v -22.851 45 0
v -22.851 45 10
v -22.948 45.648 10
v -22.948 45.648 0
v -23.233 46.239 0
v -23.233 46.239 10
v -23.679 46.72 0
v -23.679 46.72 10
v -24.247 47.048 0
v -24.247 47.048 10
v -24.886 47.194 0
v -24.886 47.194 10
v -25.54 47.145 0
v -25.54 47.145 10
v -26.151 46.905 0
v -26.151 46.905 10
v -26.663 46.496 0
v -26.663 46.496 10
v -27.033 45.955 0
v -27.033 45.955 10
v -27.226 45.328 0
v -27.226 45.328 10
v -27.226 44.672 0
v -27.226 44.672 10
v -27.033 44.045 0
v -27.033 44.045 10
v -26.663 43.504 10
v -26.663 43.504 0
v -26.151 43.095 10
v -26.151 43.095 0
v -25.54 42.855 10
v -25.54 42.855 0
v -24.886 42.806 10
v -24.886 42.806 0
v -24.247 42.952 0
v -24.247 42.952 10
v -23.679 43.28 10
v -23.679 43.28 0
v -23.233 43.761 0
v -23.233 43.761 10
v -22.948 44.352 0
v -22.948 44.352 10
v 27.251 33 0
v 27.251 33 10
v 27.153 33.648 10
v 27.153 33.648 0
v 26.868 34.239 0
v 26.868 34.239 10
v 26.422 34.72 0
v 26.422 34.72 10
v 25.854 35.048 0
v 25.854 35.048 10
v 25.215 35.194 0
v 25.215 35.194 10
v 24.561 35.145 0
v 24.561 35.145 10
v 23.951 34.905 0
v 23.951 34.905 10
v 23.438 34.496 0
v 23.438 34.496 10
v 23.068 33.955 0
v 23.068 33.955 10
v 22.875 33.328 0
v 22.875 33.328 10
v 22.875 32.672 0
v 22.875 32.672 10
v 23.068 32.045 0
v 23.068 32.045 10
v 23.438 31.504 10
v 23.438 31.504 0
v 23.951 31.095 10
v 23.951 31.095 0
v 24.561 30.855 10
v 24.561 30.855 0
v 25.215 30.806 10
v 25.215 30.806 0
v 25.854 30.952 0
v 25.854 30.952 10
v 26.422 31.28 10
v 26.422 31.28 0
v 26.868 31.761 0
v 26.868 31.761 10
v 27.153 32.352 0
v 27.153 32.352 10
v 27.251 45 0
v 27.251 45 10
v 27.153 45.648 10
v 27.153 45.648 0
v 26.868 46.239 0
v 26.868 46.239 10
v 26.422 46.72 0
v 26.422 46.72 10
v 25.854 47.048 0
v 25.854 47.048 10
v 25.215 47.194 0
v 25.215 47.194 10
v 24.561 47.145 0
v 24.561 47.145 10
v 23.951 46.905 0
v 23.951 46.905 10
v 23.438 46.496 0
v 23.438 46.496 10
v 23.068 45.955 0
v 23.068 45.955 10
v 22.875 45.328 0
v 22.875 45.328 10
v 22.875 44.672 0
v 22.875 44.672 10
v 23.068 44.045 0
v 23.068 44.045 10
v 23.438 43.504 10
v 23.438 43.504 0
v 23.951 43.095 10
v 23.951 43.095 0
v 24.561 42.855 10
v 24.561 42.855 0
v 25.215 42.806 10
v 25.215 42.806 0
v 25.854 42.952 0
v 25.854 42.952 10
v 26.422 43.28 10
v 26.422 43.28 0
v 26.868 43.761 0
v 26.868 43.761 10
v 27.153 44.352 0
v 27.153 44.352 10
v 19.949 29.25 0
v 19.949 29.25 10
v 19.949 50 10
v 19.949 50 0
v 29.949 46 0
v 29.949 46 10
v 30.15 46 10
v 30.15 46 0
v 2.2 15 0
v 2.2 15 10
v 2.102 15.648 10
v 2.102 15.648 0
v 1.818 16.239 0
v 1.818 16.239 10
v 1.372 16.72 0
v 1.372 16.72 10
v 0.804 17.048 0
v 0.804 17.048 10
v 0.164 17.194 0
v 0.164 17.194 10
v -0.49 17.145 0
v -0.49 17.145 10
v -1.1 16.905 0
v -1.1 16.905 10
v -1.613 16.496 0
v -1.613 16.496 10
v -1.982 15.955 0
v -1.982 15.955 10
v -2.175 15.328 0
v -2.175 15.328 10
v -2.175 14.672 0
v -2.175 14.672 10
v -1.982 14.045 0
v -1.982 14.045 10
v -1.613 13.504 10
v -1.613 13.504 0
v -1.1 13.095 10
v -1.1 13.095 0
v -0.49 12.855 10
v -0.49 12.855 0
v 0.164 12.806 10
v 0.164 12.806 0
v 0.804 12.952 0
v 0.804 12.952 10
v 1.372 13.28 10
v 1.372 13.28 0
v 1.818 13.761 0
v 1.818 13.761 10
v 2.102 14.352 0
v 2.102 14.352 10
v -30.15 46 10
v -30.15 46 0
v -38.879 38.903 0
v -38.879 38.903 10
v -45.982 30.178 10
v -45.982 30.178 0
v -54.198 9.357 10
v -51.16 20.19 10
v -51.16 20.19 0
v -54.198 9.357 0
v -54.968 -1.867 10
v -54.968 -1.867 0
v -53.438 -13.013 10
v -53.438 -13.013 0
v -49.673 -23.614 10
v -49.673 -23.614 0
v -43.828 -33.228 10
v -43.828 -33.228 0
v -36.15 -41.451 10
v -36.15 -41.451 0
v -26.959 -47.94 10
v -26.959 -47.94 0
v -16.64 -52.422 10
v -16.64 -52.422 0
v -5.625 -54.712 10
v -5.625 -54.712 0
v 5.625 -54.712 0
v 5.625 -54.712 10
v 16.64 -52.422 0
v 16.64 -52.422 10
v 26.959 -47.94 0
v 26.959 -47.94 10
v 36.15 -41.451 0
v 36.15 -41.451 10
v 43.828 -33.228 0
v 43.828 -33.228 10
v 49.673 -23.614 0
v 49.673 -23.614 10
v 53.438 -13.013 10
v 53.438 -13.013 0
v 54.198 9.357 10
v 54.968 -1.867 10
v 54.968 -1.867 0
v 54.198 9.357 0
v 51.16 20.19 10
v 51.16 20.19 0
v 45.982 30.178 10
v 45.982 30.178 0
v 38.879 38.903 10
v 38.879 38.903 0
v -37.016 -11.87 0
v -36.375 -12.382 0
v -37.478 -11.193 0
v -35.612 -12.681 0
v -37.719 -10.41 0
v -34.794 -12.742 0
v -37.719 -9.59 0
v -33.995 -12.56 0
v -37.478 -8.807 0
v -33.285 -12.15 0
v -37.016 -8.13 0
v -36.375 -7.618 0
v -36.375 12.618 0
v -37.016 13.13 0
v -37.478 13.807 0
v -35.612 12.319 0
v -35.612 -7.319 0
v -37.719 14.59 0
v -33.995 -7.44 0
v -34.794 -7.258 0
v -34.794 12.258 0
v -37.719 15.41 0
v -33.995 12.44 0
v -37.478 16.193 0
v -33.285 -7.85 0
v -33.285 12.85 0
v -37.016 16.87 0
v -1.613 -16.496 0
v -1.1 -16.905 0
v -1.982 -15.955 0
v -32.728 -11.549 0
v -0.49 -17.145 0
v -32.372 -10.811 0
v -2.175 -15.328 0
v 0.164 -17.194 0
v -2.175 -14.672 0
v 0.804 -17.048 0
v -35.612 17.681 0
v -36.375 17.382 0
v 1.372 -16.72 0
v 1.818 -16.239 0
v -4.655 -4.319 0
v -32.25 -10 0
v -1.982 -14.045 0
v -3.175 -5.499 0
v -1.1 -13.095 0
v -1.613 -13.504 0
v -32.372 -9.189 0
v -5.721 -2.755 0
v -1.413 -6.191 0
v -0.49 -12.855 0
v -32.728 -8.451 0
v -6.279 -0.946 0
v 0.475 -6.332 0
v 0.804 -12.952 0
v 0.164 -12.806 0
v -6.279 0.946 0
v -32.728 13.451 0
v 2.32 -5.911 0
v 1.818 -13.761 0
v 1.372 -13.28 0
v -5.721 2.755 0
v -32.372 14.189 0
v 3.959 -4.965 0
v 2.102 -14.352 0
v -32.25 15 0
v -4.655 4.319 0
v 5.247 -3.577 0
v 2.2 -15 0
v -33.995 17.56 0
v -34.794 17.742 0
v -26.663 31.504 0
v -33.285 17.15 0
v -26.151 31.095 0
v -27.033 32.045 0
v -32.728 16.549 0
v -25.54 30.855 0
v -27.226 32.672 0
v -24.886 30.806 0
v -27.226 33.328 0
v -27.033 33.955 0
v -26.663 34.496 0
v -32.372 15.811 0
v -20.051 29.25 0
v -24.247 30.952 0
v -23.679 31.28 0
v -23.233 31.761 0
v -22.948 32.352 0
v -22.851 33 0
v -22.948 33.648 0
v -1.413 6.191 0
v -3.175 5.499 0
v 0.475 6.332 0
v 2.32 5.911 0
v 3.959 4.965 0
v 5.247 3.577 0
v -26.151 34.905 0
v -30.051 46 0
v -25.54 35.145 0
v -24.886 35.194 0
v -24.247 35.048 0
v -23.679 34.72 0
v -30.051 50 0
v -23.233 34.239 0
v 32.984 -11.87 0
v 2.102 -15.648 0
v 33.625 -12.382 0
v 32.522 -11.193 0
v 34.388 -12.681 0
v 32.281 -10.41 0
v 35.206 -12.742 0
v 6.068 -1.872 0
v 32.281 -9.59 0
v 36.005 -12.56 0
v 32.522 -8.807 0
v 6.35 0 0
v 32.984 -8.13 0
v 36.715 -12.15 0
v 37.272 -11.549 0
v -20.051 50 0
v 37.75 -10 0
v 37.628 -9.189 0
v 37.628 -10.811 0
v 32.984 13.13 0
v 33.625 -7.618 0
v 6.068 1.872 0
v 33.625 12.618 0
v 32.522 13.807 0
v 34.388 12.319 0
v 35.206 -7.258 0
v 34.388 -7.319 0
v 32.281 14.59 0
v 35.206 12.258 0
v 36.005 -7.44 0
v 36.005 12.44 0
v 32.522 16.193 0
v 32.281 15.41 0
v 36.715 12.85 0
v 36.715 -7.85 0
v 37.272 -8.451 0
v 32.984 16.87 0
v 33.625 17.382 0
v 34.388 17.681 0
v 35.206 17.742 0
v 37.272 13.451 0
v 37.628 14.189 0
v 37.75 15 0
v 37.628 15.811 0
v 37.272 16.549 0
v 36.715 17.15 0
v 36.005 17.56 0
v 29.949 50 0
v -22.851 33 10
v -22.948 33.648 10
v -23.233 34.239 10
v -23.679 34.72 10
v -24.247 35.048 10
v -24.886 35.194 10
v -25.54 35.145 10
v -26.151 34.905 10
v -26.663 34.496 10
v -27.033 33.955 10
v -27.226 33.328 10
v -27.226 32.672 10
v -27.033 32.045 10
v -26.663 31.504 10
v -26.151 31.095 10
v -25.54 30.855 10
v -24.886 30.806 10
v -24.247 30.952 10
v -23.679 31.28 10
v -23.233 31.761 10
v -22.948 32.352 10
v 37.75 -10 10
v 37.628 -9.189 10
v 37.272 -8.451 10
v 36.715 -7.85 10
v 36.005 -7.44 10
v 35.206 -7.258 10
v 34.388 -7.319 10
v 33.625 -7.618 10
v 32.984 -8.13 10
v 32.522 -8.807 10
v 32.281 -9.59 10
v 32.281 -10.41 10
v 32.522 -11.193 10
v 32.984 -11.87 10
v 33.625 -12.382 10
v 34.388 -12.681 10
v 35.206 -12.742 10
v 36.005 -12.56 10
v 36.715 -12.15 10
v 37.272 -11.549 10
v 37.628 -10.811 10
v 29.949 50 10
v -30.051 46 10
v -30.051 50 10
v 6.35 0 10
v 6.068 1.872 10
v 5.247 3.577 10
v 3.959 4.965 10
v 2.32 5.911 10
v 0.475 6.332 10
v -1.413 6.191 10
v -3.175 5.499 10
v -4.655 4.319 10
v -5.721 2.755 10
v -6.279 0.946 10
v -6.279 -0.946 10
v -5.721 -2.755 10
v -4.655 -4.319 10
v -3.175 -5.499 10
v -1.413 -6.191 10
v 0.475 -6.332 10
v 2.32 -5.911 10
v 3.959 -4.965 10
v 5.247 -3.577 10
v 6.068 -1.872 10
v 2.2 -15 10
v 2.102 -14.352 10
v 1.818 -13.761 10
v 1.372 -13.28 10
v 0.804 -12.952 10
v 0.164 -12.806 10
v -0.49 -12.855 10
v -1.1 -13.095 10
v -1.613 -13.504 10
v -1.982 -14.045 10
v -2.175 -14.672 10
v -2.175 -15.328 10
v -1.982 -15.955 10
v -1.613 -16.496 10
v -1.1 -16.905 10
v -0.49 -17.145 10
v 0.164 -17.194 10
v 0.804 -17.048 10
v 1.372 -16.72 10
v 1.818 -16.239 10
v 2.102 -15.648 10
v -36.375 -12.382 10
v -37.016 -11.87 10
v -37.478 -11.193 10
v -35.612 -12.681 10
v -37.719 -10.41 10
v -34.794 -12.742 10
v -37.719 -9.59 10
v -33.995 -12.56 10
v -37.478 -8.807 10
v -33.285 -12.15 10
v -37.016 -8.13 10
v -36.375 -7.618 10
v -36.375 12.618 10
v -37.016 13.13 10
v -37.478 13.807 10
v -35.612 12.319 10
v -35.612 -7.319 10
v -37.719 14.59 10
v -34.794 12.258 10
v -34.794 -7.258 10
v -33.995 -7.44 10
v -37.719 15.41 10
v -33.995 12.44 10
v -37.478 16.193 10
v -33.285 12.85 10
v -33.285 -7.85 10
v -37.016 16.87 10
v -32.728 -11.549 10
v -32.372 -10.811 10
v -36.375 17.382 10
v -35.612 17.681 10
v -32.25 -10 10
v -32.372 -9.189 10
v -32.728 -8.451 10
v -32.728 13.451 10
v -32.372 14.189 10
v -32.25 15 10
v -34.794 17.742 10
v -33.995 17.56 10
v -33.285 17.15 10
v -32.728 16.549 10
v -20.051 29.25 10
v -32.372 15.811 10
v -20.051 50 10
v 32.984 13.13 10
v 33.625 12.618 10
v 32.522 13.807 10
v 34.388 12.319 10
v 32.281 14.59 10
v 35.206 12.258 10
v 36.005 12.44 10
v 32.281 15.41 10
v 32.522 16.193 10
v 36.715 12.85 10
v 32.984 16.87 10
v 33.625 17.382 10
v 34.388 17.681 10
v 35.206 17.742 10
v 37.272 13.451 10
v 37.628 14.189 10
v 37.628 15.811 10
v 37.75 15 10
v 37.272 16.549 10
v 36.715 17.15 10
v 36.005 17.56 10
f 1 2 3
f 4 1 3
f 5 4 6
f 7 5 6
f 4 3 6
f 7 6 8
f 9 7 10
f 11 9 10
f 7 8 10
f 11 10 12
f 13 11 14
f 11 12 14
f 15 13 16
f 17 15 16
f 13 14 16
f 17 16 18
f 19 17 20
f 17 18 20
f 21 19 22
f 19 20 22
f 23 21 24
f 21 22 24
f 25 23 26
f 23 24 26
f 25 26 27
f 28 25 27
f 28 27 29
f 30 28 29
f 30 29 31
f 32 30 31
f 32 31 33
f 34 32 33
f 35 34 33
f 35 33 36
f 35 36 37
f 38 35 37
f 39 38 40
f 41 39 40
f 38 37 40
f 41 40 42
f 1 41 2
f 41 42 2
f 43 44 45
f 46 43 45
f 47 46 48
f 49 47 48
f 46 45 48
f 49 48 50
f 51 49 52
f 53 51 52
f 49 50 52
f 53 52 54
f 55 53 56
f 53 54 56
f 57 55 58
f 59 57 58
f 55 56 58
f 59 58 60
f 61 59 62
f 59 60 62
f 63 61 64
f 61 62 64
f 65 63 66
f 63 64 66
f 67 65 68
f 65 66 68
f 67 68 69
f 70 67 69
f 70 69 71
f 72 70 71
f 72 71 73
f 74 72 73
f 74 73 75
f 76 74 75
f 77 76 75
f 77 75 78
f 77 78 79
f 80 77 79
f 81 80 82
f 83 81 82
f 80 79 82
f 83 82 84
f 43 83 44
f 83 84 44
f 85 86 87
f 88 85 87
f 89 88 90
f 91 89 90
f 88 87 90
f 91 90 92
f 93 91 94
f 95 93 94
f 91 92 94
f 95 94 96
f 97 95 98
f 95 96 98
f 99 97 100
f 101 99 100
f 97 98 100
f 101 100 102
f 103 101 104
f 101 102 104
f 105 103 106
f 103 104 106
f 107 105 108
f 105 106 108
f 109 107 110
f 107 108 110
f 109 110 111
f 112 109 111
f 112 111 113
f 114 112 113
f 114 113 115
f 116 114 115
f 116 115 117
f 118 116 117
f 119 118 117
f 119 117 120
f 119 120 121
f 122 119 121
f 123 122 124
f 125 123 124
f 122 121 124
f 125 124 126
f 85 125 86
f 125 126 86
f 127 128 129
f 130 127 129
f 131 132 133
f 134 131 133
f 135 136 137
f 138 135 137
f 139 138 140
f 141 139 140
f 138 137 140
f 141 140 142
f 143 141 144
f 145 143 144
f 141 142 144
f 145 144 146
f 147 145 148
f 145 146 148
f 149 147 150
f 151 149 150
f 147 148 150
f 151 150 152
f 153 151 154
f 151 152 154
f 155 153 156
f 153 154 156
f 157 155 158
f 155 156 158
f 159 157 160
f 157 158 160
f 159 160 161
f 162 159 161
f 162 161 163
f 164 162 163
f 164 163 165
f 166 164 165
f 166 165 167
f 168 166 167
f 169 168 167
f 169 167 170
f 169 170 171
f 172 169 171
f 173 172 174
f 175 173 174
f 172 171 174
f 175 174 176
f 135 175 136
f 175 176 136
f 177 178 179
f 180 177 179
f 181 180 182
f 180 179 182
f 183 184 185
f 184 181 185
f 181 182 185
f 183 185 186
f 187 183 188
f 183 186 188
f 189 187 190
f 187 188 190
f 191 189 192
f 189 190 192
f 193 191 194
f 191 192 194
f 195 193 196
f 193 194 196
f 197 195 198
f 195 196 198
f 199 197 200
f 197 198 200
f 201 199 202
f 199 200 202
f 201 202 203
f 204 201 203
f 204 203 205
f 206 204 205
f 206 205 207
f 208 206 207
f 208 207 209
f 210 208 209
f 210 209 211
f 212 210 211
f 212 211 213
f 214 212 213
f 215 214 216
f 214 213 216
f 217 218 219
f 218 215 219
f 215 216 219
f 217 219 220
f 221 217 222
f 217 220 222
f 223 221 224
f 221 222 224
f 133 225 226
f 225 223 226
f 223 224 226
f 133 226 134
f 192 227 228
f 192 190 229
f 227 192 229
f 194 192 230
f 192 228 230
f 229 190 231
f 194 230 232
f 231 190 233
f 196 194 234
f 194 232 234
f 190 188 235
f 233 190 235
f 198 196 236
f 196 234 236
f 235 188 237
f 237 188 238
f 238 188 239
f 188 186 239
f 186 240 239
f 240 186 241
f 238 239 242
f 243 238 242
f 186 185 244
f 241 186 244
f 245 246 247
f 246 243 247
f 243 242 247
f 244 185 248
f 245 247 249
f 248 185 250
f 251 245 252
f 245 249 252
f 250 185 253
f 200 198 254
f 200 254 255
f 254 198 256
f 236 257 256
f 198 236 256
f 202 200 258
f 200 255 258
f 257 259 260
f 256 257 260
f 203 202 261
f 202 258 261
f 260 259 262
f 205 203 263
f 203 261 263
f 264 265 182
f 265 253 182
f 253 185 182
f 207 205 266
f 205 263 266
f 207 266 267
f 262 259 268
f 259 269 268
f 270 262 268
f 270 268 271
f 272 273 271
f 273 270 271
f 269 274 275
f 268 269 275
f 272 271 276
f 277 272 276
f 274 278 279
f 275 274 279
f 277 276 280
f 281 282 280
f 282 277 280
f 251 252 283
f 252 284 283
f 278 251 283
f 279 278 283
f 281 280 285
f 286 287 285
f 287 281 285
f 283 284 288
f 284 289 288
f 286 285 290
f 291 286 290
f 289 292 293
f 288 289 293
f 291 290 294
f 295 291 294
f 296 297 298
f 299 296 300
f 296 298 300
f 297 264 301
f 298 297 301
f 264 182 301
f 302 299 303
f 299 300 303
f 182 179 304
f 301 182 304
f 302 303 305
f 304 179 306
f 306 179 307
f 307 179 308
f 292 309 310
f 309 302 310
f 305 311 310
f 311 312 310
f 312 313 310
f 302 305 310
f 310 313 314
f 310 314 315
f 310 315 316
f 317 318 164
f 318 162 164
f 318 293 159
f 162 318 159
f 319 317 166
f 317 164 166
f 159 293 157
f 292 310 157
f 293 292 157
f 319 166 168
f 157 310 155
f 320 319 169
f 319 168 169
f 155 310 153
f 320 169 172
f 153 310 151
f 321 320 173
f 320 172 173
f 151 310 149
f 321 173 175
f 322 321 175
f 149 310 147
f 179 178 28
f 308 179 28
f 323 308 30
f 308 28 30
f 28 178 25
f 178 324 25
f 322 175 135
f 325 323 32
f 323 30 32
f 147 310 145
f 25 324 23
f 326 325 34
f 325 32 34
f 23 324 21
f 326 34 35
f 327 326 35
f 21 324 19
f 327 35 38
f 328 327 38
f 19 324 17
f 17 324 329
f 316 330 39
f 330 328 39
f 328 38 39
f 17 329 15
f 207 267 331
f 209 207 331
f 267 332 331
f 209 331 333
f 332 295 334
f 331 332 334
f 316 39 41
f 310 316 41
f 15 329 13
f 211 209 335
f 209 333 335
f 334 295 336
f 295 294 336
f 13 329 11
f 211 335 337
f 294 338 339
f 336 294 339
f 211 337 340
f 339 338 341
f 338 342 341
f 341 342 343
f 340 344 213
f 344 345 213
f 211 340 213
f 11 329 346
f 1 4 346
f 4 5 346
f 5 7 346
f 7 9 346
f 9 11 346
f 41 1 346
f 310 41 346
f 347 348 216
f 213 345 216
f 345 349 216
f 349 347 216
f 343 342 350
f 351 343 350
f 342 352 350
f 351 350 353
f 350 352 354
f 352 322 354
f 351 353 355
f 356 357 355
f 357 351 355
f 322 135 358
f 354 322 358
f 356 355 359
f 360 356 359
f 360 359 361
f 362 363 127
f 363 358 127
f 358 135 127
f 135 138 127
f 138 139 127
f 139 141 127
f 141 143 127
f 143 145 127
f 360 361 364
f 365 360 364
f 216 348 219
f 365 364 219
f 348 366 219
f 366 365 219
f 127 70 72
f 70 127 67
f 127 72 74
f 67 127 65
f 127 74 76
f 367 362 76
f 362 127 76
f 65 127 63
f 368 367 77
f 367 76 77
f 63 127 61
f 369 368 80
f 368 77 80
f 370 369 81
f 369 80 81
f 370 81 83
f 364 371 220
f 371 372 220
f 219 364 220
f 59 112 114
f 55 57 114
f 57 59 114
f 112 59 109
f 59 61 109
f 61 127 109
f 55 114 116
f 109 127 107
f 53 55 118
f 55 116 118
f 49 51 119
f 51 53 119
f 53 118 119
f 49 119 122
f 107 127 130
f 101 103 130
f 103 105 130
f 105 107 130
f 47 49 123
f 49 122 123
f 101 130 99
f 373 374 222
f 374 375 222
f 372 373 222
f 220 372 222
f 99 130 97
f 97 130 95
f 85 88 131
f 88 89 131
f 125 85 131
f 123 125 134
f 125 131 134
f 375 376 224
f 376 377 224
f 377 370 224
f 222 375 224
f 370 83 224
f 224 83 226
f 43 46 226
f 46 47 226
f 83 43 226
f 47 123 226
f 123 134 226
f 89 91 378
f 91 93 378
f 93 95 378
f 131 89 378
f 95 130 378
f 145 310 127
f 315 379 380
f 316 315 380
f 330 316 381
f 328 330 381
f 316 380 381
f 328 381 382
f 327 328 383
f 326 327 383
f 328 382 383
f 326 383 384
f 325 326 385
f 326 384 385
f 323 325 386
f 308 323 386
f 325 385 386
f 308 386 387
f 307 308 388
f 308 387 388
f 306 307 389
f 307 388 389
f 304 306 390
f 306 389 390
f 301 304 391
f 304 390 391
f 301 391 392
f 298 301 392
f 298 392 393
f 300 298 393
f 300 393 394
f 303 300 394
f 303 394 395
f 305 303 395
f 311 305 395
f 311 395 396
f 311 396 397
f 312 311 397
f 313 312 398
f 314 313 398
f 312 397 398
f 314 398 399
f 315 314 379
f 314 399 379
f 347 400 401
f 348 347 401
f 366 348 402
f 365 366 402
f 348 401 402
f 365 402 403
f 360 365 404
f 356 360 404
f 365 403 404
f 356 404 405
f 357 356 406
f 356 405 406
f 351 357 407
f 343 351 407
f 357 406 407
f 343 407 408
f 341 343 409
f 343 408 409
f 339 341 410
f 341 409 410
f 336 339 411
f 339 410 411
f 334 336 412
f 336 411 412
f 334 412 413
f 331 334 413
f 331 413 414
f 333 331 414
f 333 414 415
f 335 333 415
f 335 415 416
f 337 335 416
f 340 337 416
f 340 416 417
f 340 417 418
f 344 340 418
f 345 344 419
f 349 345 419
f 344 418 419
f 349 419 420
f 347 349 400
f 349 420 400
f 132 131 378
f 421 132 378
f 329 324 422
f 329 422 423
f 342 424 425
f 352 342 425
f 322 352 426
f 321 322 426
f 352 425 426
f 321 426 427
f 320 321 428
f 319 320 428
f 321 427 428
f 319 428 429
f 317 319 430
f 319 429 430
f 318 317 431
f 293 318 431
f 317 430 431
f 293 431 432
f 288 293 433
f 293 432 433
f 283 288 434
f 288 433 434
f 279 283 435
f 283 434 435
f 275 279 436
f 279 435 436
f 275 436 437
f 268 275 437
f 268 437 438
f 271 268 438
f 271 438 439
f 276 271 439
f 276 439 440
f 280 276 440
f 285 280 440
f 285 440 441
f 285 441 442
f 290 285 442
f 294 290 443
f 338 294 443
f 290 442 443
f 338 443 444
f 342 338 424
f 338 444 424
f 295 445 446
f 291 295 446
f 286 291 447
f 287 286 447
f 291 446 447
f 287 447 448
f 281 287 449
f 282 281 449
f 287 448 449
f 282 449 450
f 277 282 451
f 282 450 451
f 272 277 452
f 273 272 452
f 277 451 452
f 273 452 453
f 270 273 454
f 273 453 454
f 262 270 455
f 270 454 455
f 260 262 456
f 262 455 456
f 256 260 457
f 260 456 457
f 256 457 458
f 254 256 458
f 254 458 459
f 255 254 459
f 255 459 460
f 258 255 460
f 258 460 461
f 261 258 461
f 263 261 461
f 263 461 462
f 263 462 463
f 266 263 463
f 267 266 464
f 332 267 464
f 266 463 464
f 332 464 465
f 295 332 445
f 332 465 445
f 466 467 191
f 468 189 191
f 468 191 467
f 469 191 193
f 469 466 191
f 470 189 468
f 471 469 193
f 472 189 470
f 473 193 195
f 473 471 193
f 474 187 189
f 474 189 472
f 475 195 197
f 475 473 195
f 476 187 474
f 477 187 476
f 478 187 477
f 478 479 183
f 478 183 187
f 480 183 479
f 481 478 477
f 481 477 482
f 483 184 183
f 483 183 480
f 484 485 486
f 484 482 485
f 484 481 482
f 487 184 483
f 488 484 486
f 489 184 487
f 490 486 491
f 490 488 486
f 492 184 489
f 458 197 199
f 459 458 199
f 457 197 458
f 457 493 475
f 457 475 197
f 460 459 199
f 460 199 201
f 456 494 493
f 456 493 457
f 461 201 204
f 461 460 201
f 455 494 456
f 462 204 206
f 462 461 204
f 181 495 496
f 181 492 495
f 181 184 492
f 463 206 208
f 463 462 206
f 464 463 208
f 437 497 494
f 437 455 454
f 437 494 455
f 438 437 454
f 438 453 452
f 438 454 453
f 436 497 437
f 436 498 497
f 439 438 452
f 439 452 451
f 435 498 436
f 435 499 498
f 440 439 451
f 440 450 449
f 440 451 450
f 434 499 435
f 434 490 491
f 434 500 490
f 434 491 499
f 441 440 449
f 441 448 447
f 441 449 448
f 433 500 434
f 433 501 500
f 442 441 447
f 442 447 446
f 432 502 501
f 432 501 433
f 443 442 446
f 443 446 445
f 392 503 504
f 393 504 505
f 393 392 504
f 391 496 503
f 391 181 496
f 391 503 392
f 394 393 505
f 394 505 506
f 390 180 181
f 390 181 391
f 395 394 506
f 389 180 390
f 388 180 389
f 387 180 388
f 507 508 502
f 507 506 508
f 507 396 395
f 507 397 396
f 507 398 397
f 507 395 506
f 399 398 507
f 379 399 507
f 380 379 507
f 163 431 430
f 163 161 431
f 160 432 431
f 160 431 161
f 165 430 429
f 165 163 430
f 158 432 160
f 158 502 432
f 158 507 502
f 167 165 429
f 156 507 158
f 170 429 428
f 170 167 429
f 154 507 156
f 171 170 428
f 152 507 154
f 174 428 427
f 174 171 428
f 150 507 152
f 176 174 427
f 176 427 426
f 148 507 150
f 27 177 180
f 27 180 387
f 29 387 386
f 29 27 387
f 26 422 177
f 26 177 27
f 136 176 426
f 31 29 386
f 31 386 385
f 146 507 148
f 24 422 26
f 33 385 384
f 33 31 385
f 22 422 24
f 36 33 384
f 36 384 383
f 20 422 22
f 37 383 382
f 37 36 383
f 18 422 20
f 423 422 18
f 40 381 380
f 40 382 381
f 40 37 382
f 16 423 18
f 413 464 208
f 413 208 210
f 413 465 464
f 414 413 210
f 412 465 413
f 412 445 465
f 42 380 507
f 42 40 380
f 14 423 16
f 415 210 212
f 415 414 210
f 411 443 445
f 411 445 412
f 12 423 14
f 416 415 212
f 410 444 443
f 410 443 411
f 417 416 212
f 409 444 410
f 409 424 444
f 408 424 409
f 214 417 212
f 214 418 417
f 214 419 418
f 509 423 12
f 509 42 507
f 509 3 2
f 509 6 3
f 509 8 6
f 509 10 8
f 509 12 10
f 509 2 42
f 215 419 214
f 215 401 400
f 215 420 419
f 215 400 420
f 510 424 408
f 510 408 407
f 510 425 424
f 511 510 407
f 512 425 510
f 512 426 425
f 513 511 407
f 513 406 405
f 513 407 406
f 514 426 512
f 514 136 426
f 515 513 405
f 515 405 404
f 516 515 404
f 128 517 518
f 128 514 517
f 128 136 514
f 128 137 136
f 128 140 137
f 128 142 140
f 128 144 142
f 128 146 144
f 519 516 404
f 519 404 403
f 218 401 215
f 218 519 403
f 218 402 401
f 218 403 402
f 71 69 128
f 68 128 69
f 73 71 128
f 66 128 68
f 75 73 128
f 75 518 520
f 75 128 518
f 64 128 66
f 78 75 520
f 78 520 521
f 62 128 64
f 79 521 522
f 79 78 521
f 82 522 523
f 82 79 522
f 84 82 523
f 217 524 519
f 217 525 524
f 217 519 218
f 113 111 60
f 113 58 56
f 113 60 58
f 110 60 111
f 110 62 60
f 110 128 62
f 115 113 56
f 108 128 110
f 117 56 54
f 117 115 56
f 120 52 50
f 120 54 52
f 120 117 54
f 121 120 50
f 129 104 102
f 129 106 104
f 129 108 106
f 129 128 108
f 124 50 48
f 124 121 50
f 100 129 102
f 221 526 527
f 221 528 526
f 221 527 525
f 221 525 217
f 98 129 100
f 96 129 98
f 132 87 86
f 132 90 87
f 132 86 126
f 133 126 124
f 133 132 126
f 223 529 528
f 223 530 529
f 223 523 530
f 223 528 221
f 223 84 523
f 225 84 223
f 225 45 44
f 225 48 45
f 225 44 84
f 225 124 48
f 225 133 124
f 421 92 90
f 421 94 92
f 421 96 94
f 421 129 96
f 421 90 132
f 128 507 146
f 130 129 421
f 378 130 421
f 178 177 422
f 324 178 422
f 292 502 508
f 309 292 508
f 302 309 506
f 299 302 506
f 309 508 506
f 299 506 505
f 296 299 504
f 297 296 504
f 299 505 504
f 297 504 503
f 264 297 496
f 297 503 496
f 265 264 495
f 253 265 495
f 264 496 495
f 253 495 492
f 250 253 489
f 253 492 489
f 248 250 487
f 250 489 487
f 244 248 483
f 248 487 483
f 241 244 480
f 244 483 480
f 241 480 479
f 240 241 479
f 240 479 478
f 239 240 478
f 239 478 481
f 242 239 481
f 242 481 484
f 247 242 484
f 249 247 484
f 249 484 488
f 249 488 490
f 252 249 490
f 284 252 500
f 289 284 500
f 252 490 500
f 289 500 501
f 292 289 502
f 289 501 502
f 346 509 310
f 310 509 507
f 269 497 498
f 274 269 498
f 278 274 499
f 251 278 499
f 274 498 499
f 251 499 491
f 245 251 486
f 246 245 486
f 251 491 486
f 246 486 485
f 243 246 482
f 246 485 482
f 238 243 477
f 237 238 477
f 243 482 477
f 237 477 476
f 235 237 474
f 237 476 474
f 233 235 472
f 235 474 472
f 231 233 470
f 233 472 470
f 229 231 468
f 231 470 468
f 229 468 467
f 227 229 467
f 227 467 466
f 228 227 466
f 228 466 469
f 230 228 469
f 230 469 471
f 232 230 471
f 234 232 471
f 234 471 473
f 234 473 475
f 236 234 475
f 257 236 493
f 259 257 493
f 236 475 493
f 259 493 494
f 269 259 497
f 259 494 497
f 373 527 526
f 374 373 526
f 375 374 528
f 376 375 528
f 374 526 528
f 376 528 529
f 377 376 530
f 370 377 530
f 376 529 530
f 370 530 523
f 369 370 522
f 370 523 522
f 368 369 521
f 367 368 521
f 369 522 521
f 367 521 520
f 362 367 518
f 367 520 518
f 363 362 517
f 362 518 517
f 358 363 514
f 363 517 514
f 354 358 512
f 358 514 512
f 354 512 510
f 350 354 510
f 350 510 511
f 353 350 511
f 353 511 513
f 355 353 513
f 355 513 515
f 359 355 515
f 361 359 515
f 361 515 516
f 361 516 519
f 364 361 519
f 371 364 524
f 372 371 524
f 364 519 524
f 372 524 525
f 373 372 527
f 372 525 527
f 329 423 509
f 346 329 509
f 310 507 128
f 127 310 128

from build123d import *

# Parameters (mm, degrees)
SKETCH1_R           = 55
EXTRUDE_3_8_DEPTH   = 10
CUT_EXTRUDE1_DEPTH  = 10
SKETCH3_W           = 10
SKETCH3_H           = 20.75
BOSS_EXTRUDE2_DEPTH = 10
SKETCH4_R           = 2.2
M4_THROUGH_DEPTH    = 10
SKETCH5_R           = 6.35
CUT_EXTRUDE2_DEPTH  = 10
SKETCH6_R           = 2.2
M4_THROUGH2_DEPTH   = 10
SKETCH7_R           = 2.75
M5_THROUGH_DEPTH    = 10


with BuildPart() as part:
    # Sketch1 → 3/8 (new body)
    with BuildSketch(Plane.XY):
        Circle(SKETCH1_R)
    extrude(amount=EXTRUDE_3_8_DEPTH)

    # Sketch2 → Cut-Extrude1 (cut)
    with BuildSketch(Plane.XY.offset(10)):
        Polygon((-20.05060394, 46), (-20.05060394, 29.25), (19.94939606, 29.25), (19.94939606, 46), (30.149626863, 46), (30.149626863, 76.355115637), (-30.149626863, 76.355115637), (-30.149626863, 46), align=None)
    extrude(amount=-CUT_EXTRUDE1_DEPTH, mode=Mode.SUBTRACT)

    # Sketch3 → Boss-Extrude2 (add)
    with BuildSketch(Plane.XY.offset(10)):
        with Locations((-25.05060394, 39.625)):
            Rectangle(SKETCH3_W, SKETCH3_H)
        with Locations((24.94939606, 39.625)):
            Rectangle(SKETCH3_W, SKETCH3_H)
    extrude(amount=-BOSS_EXTRUDE2_DEPTH)

    # Sketch4 → M4_through (cut)
    with BuildSketch(Plane.XY.offset(10)):
        with Locations((-25.05060394, 45)):
            Circle(SKETCH4_R)
        with Locations((-25.05060394, 33)):
            Circle(SKETCH4_R)
        with Locations((25.05060394, 33)):
            Circle(SKETCH4_R)
        with Locations((25.05060394, 45)):
            Circle(SKETCH4_R)
    extrude(amount=-M4_THROUGH_DEPTH, mode=Mode.SUBTRACT)

    # Sketch5 → Cut-Extrude2 (cut)
    with BuildSketch(Plane.XY.offset(10)):
        Circle(SKETCH5_R)
    extrude(amount=-CUT_EXTRUDE2_DEPTH, mode=Mode.SUBTRACT)

    # Sketch6 → M4_through2 (cut)
    with BuildSketch(Plane.XY.offset(10)):
        with Locations((0, 15)):
            Circle(SKETCH6_R)
        with Locations((0, -15)):
            Circle(SKETCH6_R)
    extrude(amount=-M4_THROUGH2_DEPTH, mode=Mode.SUBTRACT)

    # Sketch7 → M5_through (cut)
    with BuildSketch(Plane.XY.offset(10)):
        with Locations((-35, 15)):
            Circle(SKETCH7_R)
        with Locations((-35, -10)):
            Circle(SKETCH7_R)
        with Locations((35, -10)):
            Circle(SKETCH7_R)
        with Locations((35, 15)):
            Circle(SKETCH7_R)
    extrude(amount=-M5_THROUGH_DEPTH, mode=Mode.SUBTRACT)


solid = part.part
